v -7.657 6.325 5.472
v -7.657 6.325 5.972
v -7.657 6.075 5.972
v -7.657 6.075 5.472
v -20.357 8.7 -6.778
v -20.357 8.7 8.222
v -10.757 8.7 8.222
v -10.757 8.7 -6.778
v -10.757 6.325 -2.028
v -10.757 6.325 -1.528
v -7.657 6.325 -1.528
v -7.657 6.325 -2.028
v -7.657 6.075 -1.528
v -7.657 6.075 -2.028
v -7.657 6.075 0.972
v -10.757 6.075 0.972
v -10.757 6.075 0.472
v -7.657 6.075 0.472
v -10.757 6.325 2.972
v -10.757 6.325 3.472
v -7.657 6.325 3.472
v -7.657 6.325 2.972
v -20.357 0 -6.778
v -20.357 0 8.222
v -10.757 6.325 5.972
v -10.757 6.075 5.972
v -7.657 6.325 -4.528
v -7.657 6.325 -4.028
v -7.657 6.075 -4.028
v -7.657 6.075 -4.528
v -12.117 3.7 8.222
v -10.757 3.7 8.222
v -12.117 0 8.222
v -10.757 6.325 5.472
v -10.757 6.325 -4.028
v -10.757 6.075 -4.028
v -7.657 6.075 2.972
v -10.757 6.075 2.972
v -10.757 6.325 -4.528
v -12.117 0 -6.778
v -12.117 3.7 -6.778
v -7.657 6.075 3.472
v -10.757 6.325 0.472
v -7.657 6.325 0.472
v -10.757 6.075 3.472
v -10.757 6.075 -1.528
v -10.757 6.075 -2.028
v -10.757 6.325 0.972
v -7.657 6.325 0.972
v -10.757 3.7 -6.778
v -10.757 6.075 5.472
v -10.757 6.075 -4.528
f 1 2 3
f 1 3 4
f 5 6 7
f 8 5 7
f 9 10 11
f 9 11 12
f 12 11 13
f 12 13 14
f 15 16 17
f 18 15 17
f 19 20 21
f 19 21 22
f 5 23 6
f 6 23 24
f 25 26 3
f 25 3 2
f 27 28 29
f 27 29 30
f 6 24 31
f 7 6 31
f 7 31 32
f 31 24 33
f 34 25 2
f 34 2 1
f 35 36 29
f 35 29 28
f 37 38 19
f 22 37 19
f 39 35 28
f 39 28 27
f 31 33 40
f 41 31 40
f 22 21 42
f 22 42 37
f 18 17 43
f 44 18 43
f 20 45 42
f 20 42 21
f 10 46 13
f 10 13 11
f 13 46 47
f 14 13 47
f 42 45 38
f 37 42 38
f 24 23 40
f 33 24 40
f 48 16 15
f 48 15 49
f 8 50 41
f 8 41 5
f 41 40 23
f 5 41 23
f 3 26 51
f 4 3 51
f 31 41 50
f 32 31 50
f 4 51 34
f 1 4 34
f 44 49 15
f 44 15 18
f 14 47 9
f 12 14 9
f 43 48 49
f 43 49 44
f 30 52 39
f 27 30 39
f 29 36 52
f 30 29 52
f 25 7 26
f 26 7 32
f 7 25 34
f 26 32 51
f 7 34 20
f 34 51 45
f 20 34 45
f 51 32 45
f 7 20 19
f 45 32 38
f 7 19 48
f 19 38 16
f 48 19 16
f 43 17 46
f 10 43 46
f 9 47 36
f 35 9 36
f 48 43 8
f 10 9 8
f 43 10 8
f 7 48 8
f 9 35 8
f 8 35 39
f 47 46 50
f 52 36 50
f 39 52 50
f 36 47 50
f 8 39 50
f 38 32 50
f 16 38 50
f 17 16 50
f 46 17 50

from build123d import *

# Parameters (mm, degrees)
SKETCH1_W           = 8.24
SKETCH1_H           = 15
BOSS_EXTRUDE1_DEPTH = 3.7
BOSS_EXTRUDE2_DEPTH = 5
SKETCH3_W           = 0.5
SKETCH3_H           = 0.25
BOSS_EXTRUDE3_DEPTH = 3.1


with BuildPart() as part:
    # Sketch1 → Boss-Extrude1 (new body)
    with BuildSketch(Plane(origin=(0, 0, 0), x_dir=(1, 0, 0), z_dir=(0, 1, 0))):
        with Locations((-16.236881088, -0.721940399)):
            Rectangle(SKETCH1_W, SKETCH1_H)
    extrude(amount=BOSS_EXTRUDE1_DEPTH)

    # Sketch2 → Boss-Extrude2 (add)
    with BuildSketch(Plane(origin=(0, 3.7, 0), x_dir=(1, 0, 0), z_dir=(0, 1, 0))):
        Polygon((-20.356881088, -8.221940399), (-12.116881088, -8.221940399), (-10.756881088, -8.221940399), (-10.756881088, 6.778059601), (-12.116881088, 6.778059601), (-20.356881088, 6.778059601), align=None)
    extrude(amount=BOSS_EXTRUDE2_DEPTH)

    # Sketch3 → Boss-Extrude3 (add)
    with BuildSketch(Plane(origin=(-10.756881088, 0, 0), x_dir=(0, 0, -1), z_dir=(1, 0, 0))):
        with Locations((-5.721940399, 6.2)):
            Rectangle(SKETCH3_W, SKETCH3_H)
        with Locations((-3.221940399, 6.2)):
            Rectangle(SKETCH3_W, SKETCH3_H)
        with Locations((-0.721940399, 6.2)):
            Rectangle(SKETCH3_W, SKETCH3_H)
        with Locations((1.778059601, 6.2)):
            Rectangle(SKETCH3_W, SKETCH3_H)
        with Locations((4.278059601, 6.2)):
            Rectangle(SKETCH3_W, SKETCH3_H)
    extrude(amount=BOSS_EXTRUDE3_DEPTH)


solid = part.part
